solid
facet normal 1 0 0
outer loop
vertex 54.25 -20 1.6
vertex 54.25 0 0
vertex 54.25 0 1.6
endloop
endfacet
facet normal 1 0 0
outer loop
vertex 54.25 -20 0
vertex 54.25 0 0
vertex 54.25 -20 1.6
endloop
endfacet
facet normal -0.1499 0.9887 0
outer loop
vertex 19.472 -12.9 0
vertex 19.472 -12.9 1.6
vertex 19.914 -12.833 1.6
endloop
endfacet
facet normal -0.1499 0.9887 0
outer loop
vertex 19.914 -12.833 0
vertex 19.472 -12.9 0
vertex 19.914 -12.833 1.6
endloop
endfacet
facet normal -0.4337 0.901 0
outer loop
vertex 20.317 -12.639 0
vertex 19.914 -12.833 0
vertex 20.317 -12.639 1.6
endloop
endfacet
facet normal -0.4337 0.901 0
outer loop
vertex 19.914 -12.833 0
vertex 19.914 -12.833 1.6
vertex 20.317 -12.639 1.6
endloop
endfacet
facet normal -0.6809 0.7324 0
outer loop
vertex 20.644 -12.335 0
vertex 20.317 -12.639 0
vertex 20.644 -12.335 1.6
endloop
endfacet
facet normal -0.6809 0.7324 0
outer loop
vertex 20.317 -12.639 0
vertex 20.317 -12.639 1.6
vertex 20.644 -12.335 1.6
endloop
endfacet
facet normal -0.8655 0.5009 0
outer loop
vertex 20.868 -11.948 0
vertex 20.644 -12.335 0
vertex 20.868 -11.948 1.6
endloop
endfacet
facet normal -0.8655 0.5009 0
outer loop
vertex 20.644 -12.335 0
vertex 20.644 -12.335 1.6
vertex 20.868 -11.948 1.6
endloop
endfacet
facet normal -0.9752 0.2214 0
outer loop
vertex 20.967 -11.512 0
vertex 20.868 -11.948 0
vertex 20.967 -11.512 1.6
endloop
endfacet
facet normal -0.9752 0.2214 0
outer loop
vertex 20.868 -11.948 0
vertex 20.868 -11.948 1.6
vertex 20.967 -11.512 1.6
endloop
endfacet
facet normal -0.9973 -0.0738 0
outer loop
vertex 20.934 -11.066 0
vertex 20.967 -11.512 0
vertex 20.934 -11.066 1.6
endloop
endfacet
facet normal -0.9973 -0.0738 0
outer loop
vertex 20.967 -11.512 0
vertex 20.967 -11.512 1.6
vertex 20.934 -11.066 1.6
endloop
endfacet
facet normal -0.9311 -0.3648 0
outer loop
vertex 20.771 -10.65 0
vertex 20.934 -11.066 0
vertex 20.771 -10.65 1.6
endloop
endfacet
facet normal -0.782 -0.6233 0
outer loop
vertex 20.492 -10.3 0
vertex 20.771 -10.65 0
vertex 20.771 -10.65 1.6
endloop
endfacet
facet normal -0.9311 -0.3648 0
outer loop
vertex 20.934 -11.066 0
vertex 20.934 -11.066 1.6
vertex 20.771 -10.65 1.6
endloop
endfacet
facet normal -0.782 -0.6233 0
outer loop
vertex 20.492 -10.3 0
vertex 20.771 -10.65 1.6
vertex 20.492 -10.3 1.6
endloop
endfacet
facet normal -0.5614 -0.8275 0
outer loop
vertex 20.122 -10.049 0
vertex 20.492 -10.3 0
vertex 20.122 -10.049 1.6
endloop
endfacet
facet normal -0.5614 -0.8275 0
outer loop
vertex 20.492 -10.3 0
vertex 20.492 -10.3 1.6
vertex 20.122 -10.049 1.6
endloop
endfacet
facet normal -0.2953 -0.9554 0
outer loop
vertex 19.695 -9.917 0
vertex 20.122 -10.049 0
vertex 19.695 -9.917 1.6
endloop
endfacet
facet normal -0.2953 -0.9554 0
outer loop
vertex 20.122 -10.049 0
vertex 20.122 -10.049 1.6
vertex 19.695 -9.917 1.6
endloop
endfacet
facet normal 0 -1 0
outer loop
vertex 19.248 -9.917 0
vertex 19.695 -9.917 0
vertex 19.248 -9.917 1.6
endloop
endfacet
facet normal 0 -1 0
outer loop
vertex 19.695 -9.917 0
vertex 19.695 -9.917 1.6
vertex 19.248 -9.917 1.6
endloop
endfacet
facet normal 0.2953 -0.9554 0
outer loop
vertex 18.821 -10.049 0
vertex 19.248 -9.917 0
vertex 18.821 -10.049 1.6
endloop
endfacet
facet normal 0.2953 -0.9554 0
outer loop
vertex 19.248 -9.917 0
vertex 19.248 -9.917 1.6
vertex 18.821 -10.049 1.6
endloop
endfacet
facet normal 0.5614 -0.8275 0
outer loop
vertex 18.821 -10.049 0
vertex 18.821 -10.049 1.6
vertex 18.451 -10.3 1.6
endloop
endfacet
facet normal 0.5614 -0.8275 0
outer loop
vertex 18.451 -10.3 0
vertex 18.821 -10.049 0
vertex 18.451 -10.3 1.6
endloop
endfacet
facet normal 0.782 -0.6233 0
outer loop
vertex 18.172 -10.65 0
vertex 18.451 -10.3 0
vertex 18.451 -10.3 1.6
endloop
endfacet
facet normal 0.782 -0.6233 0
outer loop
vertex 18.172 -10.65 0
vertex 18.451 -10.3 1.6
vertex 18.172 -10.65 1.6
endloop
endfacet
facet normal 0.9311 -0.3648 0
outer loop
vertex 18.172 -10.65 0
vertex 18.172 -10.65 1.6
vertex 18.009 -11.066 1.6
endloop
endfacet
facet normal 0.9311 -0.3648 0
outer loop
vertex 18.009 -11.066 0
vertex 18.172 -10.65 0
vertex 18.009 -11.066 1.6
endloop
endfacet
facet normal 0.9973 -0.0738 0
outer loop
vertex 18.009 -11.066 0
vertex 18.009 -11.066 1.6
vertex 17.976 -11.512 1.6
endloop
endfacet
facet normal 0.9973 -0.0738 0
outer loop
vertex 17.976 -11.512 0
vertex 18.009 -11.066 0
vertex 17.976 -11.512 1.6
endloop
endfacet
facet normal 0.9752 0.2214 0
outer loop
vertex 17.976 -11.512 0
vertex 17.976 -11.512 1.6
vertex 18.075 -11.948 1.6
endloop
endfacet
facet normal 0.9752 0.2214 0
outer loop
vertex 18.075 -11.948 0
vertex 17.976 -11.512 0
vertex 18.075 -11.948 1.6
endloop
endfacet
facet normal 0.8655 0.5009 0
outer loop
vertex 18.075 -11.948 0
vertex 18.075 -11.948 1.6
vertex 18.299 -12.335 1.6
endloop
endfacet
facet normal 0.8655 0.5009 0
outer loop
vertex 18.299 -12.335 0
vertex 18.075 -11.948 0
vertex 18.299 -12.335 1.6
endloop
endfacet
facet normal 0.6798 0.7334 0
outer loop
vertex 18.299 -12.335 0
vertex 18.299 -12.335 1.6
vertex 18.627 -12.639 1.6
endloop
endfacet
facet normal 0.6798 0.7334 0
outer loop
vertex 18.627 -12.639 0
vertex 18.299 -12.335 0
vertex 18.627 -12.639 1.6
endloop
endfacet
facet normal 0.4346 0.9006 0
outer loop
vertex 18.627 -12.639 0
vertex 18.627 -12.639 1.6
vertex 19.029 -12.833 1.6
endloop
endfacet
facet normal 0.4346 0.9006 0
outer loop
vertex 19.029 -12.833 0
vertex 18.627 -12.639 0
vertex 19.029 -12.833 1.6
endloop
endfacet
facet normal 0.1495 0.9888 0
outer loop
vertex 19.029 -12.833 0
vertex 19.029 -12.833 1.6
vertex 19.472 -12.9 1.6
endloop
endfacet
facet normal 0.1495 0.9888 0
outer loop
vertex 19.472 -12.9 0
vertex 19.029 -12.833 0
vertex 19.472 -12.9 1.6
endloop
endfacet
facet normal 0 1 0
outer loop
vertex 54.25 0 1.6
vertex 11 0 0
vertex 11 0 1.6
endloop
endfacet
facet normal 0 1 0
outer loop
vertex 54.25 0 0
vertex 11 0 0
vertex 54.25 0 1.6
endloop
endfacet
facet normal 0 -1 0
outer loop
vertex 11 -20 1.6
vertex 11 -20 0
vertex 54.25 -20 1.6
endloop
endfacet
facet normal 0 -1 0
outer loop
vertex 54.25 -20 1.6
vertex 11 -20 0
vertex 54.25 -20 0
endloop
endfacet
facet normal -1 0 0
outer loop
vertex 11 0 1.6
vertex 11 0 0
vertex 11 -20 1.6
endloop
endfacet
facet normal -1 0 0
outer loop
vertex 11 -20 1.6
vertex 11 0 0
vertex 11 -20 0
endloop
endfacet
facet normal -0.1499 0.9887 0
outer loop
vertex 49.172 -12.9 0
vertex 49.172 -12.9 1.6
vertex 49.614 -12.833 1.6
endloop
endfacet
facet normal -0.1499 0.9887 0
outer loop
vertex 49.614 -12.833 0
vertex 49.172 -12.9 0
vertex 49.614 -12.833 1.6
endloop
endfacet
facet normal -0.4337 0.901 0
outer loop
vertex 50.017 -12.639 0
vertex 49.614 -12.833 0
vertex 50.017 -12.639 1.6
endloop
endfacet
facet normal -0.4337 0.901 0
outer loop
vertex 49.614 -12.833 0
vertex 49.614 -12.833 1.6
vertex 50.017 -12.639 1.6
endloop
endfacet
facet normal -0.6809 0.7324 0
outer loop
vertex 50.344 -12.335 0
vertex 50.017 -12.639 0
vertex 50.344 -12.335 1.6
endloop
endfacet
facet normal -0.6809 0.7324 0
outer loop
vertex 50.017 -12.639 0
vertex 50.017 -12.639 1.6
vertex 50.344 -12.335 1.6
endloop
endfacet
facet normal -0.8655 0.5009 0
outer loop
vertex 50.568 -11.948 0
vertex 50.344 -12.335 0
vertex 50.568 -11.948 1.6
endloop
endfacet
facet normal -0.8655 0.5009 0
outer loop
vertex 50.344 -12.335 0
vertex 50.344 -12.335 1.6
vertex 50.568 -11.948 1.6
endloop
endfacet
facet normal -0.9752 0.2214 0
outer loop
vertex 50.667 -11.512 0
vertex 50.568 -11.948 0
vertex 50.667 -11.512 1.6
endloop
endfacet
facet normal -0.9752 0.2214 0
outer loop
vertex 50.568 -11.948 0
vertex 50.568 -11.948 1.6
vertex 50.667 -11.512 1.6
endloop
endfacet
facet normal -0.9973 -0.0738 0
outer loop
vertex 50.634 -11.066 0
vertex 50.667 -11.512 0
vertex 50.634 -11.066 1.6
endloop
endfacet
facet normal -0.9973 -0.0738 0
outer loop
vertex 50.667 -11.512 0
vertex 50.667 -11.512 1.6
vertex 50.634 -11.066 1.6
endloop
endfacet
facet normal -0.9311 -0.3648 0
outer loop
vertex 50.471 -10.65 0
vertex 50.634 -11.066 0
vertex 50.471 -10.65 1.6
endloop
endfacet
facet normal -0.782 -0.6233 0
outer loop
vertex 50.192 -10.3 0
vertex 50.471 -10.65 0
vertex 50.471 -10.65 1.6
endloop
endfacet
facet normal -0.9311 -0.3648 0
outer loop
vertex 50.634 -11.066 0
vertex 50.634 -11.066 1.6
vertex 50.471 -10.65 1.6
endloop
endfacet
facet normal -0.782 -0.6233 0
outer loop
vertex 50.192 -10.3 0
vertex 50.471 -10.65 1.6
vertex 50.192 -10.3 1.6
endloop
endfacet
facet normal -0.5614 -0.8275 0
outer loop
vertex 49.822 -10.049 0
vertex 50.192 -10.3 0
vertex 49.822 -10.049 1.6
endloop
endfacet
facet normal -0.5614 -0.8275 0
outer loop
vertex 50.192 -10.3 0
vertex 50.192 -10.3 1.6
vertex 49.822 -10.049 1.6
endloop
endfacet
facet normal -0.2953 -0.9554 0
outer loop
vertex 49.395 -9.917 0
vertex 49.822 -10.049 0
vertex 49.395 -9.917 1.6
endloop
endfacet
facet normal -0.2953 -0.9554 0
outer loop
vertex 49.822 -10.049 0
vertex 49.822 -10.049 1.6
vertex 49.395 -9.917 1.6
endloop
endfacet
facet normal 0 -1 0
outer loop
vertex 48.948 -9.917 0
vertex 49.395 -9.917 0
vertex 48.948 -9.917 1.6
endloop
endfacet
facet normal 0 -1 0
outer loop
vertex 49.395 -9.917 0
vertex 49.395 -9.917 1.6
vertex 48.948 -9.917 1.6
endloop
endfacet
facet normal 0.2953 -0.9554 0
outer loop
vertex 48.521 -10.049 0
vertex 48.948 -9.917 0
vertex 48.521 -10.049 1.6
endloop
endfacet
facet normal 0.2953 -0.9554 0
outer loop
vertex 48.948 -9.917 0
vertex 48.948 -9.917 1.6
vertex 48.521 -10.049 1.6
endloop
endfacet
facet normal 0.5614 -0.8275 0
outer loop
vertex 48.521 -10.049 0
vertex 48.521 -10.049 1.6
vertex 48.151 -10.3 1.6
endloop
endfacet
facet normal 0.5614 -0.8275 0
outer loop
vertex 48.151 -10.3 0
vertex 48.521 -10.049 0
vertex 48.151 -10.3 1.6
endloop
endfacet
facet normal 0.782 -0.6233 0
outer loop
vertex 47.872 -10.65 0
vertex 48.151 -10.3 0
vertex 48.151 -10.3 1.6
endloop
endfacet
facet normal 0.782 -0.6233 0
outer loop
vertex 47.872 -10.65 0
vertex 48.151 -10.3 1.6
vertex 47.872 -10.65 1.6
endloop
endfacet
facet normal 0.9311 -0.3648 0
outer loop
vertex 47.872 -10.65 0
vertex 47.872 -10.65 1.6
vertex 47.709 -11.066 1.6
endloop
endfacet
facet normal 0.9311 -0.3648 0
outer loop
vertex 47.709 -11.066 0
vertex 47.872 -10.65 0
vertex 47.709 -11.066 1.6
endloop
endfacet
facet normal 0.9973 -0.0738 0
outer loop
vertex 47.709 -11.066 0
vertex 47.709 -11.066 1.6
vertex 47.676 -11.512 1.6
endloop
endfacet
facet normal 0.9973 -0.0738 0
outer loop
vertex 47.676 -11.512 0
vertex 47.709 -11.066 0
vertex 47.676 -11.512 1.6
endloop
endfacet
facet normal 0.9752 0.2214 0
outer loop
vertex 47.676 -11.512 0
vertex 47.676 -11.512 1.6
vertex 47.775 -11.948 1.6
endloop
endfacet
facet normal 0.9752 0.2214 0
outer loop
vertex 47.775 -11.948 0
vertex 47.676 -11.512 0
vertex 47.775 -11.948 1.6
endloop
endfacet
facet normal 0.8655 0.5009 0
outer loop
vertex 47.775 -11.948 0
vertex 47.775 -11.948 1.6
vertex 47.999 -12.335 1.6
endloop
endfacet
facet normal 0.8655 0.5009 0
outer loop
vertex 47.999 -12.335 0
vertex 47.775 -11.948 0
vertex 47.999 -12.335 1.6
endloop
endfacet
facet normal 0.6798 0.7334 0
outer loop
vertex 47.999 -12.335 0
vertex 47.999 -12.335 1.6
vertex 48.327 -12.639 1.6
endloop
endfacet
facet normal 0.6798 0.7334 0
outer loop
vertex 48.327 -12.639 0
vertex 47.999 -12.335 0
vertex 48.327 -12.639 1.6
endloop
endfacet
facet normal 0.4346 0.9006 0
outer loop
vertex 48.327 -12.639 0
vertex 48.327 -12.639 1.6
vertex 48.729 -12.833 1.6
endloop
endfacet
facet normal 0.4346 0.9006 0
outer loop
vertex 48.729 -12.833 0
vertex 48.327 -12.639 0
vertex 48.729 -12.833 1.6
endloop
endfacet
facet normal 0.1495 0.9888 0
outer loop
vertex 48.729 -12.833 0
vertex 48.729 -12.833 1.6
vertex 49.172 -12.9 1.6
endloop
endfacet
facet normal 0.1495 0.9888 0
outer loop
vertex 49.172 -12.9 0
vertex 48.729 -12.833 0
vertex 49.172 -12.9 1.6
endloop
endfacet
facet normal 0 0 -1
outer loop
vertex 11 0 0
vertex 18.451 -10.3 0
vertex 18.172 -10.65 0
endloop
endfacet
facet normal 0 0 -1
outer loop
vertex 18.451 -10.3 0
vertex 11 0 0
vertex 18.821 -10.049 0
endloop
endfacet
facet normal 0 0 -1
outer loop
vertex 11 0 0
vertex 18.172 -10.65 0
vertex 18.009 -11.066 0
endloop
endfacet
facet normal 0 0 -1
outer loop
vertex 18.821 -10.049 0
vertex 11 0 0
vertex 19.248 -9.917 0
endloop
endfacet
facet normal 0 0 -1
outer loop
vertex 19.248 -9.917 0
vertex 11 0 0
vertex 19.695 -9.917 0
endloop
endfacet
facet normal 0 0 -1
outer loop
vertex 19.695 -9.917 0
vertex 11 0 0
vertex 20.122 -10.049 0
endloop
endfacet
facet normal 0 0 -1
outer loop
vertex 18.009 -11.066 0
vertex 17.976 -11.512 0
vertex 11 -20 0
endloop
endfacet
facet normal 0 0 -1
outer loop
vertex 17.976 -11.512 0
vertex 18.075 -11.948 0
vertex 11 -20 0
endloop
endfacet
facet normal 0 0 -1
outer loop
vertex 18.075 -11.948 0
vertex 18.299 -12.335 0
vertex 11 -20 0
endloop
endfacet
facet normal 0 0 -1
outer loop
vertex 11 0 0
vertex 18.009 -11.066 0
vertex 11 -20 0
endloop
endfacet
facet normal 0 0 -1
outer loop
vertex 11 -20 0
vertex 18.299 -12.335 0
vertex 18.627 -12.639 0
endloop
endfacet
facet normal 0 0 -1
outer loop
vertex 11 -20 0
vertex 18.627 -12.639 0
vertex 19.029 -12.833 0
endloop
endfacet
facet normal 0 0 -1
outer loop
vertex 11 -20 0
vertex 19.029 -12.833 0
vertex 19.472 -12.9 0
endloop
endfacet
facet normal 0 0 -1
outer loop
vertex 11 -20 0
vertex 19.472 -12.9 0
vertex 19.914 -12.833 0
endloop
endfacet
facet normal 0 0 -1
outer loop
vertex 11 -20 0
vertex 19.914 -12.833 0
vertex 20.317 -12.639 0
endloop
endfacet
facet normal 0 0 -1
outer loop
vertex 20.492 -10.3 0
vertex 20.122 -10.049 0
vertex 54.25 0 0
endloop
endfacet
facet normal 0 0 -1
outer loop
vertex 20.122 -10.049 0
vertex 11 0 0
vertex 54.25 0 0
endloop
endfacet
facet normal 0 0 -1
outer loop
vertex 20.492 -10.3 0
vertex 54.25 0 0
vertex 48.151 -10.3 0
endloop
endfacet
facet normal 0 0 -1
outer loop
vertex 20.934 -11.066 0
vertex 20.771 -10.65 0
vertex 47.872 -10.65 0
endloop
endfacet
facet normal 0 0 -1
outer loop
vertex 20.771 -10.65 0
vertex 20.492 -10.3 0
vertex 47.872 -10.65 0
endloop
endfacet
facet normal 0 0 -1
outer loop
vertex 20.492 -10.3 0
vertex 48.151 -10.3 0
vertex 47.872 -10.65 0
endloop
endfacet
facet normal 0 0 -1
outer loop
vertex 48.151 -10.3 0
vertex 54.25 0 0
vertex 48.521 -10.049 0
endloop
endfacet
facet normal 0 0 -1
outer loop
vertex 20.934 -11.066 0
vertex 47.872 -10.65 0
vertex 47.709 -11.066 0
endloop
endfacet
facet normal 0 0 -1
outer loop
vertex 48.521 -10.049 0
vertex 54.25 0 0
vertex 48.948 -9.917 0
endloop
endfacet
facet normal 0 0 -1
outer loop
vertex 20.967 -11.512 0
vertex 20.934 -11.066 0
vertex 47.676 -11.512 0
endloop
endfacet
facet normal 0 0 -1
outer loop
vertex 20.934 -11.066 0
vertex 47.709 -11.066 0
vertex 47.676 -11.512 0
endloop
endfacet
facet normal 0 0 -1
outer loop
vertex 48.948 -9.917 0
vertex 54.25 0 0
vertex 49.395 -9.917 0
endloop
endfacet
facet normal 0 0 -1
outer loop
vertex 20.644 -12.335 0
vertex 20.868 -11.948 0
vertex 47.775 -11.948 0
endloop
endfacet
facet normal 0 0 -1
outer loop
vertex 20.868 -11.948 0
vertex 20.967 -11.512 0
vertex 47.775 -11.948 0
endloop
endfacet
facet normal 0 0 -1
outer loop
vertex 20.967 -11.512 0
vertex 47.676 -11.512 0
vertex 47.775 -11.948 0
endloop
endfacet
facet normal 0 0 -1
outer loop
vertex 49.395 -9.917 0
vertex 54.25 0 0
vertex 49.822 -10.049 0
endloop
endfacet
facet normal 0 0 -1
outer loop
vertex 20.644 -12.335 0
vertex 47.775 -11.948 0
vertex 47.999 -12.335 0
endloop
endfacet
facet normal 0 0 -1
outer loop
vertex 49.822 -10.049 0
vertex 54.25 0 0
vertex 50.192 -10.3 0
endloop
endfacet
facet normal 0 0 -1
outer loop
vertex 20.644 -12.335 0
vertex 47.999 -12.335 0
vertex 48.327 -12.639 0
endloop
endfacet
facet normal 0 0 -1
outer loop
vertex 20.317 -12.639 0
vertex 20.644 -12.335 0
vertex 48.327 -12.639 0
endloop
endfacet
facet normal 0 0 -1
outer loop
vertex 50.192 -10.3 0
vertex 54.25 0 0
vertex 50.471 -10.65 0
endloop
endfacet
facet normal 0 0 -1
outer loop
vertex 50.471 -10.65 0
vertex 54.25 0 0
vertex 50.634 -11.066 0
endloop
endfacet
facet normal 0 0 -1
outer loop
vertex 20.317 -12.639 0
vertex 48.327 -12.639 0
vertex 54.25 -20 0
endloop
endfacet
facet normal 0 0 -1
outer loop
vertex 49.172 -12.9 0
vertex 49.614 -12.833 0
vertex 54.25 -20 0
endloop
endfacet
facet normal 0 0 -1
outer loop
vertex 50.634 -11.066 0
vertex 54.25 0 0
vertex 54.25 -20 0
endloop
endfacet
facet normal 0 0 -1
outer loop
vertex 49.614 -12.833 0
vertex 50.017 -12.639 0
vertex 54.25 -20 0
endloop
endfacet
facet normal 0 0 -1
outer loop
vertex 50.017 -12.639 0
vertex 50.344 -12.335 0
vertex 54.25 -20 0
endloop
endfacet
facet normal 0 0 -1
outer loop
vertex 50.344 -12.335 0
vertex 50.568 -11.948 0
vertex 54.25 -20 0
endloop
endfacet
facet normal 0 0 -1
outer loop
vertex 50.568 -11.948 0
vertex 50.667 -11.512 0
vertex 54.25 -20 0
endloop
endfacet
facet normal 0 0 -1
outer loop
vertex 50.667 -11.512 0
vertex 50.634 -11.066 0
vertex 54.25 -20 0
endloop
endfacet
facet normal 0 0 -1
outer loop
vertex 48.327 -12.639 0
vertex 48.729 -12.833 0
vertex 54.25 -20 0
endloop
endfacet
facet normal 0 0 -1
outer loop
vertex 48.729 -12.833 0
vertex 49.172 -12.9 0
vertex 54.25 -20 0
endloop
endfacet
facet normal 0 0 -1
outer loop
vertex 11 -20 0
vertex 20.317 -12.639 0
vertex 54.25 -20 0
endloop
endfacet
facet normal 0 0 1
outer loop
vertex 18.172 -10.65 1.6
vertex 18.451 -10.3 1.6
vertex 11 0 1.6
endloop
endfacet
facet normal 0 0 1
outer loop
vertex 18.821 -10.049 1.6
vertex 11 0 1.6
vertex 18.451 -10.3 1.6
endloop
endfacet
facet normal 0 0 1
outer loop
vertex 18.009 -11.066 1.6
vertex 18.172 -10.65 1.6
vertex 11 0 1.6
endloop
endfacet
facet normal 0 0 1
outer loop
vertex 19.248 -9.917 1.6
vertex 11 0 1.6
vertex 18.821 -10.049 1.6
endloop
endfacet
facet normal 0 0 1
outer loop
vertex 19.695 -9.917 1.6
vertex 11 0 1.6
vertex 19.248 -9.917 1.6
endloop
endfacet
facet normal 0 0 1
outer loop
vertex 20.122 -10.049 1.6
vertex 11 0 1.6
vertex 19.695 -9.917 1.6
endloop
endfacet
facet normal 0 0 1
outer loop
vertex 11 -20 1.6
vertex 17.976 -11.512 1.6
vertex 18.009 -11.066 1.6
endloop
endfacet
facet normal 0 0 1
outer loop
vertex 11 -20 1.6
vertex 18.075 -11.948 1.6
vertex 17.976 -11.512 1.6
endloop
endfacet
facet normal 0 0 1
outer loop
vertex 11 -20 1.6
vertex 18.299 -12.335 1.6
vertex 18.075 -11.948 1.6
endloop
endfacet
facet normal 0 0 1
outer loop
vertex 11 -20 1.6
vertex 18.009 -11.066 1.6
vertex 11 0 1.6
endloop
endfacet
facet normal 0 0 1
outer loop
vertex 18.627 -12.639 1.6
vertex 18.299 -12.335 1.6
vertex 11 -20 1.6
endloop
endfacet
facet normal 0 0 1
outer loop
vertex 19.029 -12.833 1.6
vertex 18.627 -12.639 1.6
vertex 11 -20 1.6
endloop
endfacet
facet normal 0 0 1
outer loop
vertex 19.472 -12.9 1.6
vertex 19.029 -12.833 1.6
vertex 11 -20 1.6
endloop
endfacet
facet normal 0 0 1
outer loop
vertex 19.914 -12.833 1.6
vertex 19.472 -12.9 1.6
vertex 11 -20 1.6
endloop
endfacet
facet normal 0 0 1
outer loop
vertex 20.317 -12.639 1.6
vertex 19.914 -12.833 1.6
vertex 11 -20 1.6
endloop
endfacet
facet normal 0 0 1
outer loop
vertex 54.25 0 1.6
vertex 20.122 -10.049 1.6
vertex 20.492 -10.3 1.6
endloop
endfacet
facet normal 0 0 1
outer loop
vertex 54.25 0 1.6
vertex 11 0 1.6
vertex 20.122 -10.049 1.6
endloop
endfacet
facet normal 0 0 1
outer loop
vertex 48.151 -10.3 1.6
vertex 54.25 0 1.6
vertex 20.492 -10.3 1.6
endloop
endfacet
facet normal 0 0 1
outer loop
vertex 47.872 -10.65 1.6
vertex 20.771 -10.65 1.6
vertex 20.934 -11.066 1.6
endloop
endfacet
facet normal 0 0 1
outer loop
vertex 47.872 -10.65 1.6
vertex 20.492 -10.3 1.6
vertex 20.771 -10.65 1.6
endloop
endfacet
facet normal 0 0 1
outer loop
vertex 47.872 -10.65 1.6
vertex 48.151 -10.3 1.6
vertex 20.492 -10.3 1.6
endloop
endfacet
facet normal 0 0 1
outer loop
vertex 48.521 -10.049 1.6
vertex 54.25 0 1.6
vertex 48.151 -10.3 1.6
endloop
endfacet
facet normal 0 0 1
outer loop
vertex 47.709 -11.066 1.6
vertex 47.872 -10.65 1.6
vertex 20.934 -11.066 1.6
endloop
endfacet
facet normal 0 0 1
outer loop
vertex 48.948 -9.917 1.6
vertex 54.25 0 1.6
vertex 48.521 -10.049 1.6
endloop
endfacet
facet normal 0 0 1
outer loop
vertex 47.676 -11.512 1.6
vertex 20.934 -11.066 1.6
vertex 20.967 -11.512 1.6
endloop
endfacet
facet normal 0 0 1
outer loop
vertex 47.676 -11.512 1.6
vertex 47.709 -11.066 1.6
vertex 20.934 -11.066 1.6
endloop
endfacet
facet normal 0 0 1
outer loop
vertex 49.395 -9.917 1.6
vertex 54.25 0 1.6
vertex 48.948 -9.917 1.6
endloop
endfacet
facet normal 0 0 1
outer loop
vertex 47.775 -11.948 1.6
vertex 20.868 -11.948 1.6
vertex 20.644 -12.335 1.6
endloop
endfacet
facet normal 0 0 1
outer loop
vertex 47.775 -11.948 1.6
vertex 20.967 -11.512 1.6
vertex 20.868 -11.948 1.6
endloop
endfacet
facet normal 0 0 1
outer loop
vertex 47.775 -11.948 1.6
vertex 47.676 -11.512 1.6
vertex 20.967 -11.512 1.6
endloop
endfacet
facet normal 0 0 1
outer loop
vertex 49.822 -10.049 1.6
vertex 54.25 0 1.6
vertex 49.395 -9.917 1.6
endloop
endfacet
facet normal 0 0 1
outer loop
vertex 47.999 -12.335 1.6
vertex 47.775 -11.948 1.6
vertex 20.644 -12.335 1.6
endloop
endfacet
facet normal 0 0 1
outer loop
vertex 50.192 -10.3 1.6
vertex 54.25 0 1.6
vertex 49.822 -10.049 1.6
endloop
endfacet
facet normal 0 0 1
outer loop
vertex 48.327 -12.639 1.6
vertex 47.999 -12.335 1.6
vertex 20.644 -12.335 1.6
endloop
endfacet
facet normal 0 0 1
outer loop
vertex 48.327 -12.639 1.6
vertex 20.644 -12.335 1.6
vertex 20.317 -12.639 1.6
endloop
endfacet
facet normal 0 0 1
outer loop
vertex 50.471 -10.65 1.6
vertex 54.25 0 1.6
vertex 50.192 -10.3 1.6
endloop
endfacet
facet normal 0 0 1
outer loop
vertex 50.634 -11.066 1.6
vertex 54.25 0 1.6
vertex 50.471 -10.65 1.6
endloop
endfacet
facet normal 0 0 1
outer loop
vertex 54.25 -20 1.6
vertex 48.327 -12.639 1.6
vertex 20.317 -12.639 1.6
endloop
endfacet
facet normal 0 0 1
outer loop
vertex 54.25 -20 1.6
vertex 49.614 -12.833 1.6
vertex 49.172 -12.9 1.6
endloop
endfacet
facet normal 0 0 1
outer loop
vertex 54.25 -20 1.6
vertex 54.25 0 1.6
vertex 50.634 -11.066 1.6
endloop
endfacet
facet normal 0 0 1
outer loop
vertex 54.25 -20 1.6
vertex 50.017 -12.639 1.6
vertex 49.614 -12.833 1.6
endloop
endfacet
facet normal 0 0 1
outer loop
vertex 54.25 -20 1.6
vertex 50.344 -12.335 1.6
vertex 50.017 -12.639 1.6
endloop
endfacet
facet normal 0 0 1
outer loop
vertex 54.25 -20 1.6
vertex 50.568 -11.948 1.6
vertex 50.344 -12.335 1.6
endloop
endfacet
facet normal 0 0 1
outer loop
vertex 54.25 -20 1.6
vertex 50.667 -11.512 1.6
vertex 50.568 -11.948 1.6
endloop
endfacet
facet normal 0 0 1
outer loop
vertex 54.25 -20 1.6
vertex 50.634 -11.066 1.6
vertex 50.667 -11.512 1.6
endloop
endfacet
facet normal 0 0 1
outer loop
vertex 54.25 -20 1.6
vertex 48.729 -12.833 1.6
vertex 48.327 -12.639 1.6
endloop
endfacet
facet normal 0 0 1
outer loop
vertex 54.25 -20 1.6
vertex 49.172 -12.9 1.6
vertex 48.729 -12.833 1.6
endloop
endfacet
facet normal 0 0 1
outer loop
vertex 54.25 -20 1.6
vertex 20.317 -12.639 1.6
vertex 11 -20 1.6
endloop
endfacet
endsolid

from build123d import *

# Parameters (mm, degrees)
SKETCH004_R      = 1.5
EXTRUDE004_DEPTH = 2
BOX002_W         = 20
BOX002_H         = 43.25
BOX002_DEPTH     = 1.6


with BuildPart() as holesextrude:
    # Sketch004 (on Face6 of Box002) → Extrude004 (new body)
    with BuildSketch(Plane(origin=(11, 0, 1.6), x_dir=(0, -1, 0), z_dir=(0, 0, 1))):
        with Locations((11.4, 38.171532)):
            Circle(SKETCH004_R)
        with Locations((11.4, 8.471532)):
            Circle(SKETCH004_R)
    extrude(amount=-EXTRUDE004_DEPTH)


with BuildPart() as board002:
    # Box002 → Box002 (new body)
    with BuildSketch(Plane(origin=(11, 0, 0), x_dir=(0, -1, 0), z_dir=(0, 0, 1))):
        with Locations((10, 21.625)):
            Rectangle(BOX002_W, BOX002_H)
    extrude(amount=BOX002_DEPTH)

    # Cut001: cut HolesExtrude
    add(holesextrude.part, mode=Mode.SUBTRACT)


solid = board002.part
